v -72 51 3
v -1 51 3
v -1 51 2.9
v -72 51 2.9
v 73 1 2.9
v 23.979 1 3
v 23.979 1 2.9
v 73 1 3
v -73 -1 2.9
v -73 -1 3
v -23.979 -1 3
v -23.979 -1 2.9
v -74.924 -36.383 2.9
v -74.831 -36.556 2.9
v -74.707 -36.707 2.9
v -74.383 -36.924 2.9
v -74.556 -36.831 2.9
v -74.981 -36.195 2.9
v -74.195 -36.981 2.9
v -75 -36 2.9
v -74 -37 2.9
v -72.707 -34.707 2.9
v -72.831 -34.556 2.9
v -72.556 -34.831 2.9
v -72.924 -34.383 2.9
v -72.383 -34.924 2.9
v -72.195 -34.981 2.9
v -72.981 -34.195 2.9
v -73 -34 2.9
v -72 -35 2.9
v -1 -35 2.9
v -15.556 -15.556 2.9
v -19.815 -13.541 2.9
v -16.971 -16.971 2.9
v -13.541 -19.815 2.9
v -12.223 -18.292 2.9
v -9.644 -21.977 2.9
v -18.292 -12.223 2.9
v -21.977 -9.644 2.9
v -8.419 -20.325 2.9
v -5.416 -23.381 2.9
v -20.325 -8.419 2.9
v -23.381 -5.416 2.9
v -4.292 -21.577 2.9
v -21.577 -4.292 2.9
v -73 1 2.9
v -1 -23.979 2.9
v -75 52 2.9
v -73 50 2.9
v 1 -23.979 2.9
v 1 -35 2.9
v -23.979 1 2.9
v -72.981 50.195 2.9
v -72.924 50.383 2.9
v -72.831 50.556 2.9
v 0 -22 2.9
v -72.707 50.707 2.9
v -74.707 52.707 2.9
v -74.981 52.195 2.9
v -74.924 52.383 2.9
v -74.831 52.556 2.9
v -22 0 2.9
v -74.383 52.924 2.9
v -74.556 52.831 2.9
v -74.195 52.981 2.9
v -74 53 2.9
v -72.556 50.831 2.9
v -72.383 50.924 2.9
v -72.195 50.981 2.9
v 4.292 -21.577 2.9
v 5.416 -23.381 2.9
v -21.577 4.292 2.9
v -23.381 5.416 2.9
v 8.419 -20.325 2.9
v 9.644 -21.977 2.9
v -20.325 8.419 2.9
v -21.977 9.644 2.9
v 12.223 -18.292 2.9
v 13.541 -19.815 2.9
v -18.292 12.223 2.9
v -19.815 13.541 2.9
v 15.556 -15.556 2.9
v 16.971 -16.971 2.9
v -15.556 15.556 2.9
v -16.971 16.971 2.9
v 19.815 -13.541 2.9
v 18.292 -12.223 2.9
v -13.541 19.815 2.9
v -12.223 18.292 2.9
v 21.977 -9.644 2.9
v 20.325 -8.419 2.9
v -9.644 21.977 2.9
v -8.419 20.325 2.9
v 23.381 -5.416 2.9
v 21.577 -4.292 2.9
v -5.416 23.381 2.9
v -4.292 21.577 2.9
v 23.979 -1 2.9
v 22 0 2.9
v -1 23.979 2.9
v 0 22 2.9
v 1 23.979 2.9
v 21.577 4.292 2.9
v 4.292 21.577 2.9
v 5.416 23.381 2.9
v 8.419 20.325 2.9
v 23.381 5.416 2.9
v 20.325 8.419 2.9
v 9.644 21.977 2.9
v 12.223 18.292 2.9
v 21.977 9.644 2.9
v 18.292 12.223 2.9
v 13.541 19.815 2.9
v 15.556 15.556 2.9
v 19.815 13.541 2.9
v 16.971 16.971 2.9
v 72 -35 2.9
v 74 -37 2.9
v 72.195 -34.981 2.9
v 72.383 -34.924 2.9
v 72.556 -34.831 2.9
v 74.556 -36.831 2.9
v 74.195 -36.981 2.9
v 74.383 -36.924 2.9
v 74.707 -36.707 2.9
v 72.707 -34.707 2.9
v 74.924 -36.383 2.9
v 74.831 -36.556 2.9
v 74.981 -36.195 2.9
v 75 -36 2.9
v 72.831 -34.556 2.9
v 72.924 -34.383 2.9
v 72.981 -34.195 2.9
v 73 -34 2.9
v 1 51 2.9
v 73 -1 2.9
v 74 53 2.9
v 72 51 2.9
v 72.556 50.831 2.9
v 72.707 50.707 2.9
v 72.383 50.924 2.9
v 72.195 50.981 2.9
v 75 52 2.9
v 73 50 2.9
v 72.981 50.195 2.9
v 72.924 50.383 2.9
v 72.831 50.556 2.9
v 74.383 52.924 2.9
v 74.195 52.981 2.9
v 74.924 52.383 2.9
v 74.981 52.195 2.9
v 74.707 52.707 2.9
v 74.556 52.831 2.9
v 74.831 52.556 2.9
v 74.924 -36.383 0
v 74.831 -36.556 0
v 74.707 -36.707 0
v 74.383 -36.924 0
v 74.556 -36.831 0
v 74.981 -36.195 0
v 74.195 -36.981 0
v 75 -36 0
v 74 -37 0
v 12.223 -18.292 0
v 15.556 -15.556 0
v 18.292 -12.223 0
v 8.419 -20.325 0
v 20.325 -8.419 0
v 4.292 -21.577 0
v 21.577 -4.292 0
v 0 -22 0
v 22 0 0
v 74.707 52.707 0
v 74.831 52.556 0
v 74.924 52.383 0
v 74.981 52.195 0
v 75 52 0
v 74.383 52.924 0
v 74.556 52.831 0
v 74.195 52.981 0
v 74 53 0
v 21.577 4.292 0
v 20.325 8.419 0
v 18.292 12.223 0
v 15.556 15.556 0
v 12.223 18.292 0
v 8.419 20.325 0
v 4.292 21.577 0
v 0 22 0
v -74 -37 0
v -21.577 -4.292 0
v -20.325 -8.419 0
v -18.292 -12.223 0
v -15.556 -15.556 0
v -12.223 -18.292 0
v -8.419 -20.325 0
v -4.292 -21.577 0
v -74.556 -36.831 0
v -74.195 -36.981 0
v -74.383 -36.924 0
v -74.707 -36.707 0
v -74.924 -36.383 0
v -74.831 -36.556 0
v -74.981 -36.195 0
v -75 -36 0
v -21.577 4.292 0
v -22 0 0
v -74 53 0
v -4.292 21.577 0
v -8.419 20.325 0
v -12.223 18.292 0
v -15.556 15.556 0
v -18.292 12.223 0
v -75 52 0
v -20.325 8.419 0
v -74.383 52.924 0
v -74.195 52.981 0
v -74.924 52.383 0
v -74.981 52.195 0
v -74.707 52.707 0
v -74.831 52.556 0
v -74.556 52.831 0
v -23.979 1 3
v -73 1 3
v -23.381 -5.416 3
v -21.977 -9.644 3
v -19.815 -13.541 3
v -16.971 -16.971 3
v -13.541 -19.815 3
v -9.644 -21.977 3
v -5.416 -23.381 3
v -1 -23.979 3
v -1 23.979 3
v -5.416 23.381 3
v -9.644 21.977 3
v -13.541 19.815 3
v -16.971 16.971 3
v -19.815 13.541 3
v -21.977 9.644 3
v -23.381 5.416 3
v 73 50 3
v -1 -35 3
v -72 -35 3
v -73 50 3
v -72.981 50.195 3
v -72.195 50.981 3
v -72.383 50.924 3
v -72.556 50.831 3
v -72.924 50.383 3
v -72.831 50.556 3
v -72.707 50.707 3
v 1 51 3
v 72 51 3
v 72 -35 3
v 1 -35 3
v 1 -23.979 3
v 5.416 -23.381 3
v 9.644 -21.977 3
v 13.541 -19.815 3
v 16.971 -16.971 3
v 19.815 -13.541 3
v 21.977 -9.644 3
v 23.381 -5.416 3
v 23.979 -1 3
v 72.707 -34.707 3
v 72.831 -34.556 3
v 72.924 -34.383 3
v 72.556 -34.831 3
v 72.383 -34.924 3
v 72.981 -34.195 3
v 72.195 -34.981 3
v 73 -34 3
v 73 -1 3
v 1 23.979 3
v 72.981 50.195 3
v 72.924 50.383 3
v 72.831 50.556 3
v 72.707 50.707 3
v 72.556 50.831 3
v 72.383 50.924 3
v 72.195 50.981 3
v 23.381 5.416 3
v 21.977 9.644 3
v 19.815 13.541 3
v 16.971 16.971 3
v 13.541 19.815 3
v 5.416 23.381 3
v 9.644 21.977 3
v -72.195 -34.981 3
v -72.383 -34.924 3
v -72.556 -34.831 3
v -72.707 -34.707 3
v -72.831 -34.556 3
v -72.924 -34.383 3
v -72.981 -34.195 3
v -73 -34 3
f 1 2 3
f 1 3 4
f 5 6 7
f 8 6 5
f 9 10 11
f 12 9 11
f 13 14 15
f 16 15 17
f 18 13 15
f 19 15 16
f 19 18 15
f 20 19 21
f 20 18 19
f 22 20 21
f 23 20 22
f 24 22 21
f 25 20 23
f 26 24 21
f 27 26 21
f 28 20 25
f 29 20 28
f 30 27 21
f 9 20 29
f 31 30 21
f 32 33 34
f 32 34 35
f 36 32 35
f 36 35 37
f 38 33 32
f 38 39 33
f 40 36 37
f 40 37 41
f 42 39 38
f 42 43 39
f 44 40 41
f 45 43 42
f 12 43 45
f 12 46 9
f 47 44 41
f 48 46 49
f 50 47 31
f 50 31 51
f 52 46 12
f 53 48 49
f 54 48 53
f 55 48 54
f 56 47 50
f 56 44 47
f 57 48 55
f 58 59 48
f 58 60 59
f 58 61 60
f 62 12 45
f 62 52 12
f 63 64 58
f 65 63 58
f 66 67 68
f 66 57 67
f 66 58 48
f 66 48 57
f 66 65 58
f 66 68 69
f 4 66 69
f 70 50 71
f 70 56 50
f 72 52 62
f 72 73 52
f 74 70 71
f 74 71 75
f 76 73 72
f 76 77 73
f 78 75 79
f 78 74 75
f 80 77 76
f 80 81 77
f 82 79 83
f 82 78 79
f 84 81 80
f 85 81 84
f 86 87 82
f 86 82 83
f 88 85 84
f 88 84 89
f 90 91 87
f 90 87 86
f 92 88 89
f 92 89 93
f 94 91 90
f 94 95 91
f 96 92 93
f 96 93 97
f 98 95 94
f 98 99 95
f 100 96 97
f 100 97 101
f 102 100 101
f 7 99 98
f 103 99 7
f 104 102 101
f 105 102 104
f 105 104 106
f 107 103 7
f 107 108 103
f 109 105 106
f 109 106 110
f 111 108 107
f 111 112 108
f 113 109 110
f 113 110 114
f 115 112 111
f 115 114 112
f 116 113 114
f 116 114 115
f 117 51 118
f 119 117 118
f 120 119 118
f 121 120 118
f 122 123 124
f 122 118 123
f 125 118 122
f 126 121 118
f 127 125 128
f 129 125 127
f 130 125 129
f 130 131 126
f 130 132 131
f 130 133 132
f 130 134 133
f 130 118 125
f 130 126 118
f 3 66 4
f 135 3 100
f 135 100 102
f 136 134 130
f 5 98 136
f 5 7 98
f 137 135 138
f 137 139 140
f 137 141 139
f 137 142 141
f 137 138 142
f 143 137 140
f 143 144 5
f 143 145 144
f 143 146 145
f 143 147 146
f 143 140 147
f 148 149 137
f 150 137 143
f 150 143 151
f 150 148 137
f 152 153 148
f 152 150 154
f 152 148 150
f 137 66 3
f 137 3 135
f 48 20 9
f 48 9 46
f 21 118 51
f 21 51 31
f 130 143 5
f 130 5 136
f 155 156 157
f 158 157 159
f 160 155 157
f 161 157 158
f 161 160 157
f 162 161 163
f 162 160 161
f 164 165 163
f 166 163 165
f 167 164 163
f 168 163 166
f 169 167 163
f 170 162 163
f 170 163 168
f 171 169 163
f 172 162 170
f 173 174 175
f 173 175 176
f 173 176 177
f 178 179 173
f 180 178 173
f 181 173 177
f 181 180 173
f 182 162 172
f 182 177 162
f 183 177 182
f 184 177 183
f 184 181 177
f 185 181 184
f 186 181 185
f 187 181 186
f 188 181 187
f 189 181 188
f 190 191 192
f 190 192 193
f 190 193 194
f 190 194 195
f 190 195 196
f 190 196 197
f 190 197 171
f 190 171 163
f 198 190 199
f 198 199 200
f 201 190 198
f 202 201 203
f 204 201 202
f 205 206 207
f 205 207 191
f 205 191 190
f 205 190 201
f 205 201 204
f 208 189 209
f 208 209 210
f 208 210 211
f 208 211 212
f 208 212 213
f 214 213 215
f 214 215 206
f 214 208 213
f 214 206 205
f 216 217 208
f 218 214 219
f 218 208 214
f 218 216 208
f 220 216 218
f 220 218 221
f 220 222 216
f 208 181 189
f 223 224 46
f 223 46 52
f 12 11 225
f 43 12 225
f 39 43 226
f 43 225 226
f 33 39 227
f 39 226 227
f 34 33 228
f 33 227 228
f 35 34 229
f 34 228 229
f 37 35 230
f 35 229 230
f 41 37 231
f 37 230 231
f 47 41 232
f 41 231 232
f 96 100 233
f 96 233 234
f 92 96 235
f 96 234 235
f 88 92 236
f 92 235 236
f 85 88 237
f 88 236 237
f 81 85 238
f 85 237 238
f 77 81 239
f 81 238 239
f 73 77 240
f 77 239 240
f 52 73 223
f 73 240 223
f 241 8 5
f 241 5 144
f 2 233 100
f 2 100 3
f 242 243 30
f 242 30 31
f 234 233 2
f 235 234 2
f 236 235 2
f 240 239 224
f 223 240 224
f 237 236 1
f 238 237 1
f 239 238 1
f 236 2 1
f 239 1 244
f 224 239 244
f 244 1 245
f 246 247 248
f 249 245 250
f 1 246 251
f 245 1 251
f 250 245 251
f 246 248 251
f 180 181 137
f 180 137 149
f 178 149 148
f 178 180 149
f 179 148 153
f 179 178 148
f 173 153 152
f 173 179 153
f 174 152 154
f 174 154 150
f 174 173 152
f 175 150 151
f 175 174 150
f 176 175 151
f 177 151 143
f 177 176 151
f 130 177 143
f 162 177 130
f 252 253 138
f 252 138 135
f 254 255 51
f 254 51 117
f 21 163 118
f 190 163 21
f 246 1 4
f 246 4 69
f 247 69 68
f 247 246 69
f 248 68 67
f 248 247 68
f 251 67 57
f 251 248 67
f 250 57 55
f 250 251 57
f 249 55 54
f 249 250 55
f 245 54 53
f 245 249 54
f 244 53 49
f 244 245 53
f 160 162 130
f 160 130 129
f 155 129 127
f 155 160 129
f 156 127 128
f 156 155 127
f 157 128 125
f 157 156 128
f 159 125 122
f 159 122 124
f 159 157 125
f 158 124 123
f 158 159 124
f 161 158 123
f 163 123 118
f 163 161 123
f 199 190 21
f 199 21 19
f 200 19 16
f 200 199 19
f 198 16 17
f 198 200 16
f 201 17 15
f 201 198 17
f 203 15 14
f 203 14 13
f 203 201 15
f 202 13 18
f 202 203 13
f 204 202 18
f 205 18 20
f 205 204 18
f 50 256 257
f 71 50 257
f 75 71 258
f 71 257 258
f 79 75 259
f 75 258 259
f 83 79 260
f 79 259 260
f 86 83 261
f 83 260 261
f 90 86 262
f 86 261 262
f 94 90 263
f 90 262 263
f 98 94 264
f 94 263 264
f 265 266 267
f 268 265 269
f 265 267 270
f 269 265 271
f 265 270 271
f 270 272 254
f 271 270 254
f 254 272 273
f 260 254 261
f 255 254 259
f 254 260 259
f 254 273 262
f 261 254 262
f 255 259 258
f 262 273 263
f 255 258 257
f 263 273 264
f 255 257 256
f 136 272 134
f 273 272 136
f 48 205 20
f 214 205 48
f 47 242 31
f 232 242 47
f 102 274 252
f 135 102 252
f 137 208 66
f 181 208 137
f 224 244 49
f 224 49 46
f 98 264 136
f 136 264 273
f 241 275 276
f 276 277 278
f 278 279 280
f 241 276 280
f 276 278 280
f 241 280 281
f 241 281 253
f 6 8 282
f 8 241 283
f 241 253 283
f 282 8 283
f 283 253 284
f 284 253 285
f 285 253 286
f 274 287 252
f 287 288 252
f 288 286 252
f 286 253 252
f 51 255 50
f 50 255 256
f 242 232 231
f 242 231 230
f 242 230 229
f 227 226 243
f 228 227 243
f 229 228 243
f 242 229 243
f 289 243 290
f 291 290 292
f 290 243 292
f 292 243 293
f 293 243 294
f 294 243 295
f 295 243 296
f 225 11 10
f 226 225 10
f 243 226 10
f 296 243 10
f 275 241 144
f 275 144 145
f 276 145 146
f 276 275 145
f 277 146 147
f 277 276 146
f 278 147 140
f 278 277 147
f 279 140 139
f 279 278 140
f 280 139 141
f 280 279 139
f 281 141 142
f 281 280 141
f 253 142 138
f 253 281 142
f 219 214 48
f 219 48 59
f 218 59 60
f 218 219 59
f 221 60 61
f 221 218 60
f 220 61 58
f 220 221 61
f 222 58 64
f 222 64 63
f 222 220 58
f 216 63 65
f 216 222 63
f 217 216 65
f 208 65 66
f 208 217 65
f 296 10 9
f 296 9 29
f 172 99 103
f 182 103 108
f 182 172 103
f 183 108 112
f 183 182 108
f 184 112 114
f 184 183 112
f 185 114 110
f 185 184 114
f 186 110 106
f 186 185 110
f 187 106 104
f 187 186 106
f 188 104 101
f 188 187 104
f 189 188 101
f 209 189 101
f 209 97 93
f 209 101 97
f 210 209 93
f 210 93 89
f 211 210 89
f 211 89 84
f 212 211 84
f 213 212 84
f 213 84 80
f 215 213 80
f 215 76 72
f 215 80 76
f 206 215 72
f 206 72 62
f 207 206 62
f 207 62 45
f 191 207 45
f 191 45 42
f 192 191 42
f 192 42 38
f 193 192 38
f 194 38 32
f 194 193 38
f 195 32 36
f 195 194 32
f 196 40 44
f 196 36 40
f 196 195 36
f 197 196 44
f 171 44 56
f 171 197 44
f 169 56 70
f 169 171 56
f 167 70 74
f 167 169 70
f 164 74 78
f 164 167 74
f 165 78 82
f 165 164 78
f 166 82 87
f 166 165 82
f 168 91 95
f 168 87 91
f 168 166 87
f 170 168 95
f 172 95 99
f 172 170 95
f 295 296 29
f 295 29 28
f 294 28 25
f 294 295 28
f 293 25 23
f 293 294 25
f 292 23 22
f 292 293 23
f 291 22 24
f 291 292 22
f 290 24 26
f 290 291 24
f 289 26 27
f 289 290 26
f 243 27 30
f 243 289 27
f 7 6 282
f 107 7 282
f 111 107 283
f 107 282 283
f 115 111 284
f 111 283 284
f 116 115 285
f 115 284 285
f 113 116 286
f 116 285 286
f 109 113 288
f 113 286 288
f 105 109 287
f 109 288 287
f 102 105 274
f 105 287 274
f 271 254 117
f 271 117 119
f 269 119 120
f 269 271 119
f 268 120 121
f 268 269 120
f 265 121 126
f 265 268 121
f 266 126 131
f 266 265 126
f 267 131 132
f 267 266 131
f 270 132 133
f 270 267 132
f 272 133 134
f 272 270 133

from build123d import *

# Parameters (mm, degrees)
SKETCH_1_R          = 22
EXTRUDE_1_DEPTH     = 3
SKETCH_6_R          = 24
CUT_EXTRUDE_1_DEPTH = 0.1
SKETCH_7_W          = 161.718450326
SKETCH_7_H          = 100.382420291
CUT_EXTRUDE_2_DEPTH = 0.1
SKETCH_8_W          = 2
SKETCH_8_H          = 101.647080703
CUT_EXTRUDE_3_DEPTH = 0.1
SKETCH_9_W          = 185.430833072
SKETCH_9_H          = 2
CUT_EXTRUDE_4_DEPTH = 0.1


with BuildPart() as part:
    # Эскиз1 → Бобышка-Вытянуть1 (new body)
    with BuildSketch(Plane.XY):
        with BuildLine():
            Line((-74, 53), (74, 53))
            ThreePointArc((74, 53), (74.707106781, 52.707106781), (75, 52))
            Line((75, 52), (75, -36))
            ThreePointArc((75, -36), (74.707106781, -36.707106781), (74, -37))
            Line((74, -37), (-74, -37))
            ThreePointArc((-74, -37), (-74.707106781, -36.707106781), (-75, -36))
            Line((-75, -36), (-75, 52))
            ThreePointArc((-75, 52), (-74.707106781, 52.707106781), (-74, 53))
        make_face()
        Circle(SKETCH_1_R, mode=Mode.SUBTRACT)
    extrude(amount=EXTRUDE_1_DEPTH)

    # Эскиз6 → Вырез-Вытянуть1 (cut)
    with BuildSketch(Plane.XY.offset(3)):
        Circle(SKETCH_6_R)
    extrude(amount=-CUT_EXTRUDE_1_DEPTH, mode=Mode.SUBTRACT)

    # Эскиз7 → Вырез-Вытянуть2 (cut)
    with BuildSketch(Plane.XY.offset(3)):
        with Locations((0.395206379, 8.158082552)):
            Rectangle(SKETCH_7_W, SKETCH_7_H)
        with BuildLine():
            Line((72, 51), (-72, 51))
            ThreePointArc((-72, 51), (-72.707106781, 50.707106781), (-73, 50))
            Line((-73, 50), (-73, -34))
            ThreePointArc((-73, -34), (-72.707106781, -34.707106781), (-72, -35))
            Line((-72, -35), (72, -35))
            ThreePointArc((72, -35), (72.707106781, -34.707106781), (73, -34))
            Line((73, -34), (73, 50))
            ThreePointArc((73, 50), (72.707106781, 50.707106781), (72, 51))
        make_face(mode=Mode.SUBTRACT)
    extrude(amount=-CUT_EXTRUDE_2_DEPTH, mode=Mode.SUBTRACT)

    # Эскиз8 → Вырез-Вытянуть3 (cut)
    with BuildSketch(Plane.XY.offset(3)):
        with Locations((0, 5.154514071)):
            Rectangle(SKETCH_8_W, SKETCH_8_H)
    extrude(amount=-CUT_EXTRUDE_3_DEPTH, mode=Mode.SUBTRACT)

    # Эскиз9 → Вырез-Вытянуть4 (cut)
    with BuildSketch(Plane.XY.offset(3)):
        with Locations((6.718508445, 0)):
            Rectangle(SKETCH_9_W, SKETCH_9_H)
    extrude(amount=-CUT_EXTRUDE_4_DEPTH, mode=Mode.SUBTRACT)


solid = part.part
